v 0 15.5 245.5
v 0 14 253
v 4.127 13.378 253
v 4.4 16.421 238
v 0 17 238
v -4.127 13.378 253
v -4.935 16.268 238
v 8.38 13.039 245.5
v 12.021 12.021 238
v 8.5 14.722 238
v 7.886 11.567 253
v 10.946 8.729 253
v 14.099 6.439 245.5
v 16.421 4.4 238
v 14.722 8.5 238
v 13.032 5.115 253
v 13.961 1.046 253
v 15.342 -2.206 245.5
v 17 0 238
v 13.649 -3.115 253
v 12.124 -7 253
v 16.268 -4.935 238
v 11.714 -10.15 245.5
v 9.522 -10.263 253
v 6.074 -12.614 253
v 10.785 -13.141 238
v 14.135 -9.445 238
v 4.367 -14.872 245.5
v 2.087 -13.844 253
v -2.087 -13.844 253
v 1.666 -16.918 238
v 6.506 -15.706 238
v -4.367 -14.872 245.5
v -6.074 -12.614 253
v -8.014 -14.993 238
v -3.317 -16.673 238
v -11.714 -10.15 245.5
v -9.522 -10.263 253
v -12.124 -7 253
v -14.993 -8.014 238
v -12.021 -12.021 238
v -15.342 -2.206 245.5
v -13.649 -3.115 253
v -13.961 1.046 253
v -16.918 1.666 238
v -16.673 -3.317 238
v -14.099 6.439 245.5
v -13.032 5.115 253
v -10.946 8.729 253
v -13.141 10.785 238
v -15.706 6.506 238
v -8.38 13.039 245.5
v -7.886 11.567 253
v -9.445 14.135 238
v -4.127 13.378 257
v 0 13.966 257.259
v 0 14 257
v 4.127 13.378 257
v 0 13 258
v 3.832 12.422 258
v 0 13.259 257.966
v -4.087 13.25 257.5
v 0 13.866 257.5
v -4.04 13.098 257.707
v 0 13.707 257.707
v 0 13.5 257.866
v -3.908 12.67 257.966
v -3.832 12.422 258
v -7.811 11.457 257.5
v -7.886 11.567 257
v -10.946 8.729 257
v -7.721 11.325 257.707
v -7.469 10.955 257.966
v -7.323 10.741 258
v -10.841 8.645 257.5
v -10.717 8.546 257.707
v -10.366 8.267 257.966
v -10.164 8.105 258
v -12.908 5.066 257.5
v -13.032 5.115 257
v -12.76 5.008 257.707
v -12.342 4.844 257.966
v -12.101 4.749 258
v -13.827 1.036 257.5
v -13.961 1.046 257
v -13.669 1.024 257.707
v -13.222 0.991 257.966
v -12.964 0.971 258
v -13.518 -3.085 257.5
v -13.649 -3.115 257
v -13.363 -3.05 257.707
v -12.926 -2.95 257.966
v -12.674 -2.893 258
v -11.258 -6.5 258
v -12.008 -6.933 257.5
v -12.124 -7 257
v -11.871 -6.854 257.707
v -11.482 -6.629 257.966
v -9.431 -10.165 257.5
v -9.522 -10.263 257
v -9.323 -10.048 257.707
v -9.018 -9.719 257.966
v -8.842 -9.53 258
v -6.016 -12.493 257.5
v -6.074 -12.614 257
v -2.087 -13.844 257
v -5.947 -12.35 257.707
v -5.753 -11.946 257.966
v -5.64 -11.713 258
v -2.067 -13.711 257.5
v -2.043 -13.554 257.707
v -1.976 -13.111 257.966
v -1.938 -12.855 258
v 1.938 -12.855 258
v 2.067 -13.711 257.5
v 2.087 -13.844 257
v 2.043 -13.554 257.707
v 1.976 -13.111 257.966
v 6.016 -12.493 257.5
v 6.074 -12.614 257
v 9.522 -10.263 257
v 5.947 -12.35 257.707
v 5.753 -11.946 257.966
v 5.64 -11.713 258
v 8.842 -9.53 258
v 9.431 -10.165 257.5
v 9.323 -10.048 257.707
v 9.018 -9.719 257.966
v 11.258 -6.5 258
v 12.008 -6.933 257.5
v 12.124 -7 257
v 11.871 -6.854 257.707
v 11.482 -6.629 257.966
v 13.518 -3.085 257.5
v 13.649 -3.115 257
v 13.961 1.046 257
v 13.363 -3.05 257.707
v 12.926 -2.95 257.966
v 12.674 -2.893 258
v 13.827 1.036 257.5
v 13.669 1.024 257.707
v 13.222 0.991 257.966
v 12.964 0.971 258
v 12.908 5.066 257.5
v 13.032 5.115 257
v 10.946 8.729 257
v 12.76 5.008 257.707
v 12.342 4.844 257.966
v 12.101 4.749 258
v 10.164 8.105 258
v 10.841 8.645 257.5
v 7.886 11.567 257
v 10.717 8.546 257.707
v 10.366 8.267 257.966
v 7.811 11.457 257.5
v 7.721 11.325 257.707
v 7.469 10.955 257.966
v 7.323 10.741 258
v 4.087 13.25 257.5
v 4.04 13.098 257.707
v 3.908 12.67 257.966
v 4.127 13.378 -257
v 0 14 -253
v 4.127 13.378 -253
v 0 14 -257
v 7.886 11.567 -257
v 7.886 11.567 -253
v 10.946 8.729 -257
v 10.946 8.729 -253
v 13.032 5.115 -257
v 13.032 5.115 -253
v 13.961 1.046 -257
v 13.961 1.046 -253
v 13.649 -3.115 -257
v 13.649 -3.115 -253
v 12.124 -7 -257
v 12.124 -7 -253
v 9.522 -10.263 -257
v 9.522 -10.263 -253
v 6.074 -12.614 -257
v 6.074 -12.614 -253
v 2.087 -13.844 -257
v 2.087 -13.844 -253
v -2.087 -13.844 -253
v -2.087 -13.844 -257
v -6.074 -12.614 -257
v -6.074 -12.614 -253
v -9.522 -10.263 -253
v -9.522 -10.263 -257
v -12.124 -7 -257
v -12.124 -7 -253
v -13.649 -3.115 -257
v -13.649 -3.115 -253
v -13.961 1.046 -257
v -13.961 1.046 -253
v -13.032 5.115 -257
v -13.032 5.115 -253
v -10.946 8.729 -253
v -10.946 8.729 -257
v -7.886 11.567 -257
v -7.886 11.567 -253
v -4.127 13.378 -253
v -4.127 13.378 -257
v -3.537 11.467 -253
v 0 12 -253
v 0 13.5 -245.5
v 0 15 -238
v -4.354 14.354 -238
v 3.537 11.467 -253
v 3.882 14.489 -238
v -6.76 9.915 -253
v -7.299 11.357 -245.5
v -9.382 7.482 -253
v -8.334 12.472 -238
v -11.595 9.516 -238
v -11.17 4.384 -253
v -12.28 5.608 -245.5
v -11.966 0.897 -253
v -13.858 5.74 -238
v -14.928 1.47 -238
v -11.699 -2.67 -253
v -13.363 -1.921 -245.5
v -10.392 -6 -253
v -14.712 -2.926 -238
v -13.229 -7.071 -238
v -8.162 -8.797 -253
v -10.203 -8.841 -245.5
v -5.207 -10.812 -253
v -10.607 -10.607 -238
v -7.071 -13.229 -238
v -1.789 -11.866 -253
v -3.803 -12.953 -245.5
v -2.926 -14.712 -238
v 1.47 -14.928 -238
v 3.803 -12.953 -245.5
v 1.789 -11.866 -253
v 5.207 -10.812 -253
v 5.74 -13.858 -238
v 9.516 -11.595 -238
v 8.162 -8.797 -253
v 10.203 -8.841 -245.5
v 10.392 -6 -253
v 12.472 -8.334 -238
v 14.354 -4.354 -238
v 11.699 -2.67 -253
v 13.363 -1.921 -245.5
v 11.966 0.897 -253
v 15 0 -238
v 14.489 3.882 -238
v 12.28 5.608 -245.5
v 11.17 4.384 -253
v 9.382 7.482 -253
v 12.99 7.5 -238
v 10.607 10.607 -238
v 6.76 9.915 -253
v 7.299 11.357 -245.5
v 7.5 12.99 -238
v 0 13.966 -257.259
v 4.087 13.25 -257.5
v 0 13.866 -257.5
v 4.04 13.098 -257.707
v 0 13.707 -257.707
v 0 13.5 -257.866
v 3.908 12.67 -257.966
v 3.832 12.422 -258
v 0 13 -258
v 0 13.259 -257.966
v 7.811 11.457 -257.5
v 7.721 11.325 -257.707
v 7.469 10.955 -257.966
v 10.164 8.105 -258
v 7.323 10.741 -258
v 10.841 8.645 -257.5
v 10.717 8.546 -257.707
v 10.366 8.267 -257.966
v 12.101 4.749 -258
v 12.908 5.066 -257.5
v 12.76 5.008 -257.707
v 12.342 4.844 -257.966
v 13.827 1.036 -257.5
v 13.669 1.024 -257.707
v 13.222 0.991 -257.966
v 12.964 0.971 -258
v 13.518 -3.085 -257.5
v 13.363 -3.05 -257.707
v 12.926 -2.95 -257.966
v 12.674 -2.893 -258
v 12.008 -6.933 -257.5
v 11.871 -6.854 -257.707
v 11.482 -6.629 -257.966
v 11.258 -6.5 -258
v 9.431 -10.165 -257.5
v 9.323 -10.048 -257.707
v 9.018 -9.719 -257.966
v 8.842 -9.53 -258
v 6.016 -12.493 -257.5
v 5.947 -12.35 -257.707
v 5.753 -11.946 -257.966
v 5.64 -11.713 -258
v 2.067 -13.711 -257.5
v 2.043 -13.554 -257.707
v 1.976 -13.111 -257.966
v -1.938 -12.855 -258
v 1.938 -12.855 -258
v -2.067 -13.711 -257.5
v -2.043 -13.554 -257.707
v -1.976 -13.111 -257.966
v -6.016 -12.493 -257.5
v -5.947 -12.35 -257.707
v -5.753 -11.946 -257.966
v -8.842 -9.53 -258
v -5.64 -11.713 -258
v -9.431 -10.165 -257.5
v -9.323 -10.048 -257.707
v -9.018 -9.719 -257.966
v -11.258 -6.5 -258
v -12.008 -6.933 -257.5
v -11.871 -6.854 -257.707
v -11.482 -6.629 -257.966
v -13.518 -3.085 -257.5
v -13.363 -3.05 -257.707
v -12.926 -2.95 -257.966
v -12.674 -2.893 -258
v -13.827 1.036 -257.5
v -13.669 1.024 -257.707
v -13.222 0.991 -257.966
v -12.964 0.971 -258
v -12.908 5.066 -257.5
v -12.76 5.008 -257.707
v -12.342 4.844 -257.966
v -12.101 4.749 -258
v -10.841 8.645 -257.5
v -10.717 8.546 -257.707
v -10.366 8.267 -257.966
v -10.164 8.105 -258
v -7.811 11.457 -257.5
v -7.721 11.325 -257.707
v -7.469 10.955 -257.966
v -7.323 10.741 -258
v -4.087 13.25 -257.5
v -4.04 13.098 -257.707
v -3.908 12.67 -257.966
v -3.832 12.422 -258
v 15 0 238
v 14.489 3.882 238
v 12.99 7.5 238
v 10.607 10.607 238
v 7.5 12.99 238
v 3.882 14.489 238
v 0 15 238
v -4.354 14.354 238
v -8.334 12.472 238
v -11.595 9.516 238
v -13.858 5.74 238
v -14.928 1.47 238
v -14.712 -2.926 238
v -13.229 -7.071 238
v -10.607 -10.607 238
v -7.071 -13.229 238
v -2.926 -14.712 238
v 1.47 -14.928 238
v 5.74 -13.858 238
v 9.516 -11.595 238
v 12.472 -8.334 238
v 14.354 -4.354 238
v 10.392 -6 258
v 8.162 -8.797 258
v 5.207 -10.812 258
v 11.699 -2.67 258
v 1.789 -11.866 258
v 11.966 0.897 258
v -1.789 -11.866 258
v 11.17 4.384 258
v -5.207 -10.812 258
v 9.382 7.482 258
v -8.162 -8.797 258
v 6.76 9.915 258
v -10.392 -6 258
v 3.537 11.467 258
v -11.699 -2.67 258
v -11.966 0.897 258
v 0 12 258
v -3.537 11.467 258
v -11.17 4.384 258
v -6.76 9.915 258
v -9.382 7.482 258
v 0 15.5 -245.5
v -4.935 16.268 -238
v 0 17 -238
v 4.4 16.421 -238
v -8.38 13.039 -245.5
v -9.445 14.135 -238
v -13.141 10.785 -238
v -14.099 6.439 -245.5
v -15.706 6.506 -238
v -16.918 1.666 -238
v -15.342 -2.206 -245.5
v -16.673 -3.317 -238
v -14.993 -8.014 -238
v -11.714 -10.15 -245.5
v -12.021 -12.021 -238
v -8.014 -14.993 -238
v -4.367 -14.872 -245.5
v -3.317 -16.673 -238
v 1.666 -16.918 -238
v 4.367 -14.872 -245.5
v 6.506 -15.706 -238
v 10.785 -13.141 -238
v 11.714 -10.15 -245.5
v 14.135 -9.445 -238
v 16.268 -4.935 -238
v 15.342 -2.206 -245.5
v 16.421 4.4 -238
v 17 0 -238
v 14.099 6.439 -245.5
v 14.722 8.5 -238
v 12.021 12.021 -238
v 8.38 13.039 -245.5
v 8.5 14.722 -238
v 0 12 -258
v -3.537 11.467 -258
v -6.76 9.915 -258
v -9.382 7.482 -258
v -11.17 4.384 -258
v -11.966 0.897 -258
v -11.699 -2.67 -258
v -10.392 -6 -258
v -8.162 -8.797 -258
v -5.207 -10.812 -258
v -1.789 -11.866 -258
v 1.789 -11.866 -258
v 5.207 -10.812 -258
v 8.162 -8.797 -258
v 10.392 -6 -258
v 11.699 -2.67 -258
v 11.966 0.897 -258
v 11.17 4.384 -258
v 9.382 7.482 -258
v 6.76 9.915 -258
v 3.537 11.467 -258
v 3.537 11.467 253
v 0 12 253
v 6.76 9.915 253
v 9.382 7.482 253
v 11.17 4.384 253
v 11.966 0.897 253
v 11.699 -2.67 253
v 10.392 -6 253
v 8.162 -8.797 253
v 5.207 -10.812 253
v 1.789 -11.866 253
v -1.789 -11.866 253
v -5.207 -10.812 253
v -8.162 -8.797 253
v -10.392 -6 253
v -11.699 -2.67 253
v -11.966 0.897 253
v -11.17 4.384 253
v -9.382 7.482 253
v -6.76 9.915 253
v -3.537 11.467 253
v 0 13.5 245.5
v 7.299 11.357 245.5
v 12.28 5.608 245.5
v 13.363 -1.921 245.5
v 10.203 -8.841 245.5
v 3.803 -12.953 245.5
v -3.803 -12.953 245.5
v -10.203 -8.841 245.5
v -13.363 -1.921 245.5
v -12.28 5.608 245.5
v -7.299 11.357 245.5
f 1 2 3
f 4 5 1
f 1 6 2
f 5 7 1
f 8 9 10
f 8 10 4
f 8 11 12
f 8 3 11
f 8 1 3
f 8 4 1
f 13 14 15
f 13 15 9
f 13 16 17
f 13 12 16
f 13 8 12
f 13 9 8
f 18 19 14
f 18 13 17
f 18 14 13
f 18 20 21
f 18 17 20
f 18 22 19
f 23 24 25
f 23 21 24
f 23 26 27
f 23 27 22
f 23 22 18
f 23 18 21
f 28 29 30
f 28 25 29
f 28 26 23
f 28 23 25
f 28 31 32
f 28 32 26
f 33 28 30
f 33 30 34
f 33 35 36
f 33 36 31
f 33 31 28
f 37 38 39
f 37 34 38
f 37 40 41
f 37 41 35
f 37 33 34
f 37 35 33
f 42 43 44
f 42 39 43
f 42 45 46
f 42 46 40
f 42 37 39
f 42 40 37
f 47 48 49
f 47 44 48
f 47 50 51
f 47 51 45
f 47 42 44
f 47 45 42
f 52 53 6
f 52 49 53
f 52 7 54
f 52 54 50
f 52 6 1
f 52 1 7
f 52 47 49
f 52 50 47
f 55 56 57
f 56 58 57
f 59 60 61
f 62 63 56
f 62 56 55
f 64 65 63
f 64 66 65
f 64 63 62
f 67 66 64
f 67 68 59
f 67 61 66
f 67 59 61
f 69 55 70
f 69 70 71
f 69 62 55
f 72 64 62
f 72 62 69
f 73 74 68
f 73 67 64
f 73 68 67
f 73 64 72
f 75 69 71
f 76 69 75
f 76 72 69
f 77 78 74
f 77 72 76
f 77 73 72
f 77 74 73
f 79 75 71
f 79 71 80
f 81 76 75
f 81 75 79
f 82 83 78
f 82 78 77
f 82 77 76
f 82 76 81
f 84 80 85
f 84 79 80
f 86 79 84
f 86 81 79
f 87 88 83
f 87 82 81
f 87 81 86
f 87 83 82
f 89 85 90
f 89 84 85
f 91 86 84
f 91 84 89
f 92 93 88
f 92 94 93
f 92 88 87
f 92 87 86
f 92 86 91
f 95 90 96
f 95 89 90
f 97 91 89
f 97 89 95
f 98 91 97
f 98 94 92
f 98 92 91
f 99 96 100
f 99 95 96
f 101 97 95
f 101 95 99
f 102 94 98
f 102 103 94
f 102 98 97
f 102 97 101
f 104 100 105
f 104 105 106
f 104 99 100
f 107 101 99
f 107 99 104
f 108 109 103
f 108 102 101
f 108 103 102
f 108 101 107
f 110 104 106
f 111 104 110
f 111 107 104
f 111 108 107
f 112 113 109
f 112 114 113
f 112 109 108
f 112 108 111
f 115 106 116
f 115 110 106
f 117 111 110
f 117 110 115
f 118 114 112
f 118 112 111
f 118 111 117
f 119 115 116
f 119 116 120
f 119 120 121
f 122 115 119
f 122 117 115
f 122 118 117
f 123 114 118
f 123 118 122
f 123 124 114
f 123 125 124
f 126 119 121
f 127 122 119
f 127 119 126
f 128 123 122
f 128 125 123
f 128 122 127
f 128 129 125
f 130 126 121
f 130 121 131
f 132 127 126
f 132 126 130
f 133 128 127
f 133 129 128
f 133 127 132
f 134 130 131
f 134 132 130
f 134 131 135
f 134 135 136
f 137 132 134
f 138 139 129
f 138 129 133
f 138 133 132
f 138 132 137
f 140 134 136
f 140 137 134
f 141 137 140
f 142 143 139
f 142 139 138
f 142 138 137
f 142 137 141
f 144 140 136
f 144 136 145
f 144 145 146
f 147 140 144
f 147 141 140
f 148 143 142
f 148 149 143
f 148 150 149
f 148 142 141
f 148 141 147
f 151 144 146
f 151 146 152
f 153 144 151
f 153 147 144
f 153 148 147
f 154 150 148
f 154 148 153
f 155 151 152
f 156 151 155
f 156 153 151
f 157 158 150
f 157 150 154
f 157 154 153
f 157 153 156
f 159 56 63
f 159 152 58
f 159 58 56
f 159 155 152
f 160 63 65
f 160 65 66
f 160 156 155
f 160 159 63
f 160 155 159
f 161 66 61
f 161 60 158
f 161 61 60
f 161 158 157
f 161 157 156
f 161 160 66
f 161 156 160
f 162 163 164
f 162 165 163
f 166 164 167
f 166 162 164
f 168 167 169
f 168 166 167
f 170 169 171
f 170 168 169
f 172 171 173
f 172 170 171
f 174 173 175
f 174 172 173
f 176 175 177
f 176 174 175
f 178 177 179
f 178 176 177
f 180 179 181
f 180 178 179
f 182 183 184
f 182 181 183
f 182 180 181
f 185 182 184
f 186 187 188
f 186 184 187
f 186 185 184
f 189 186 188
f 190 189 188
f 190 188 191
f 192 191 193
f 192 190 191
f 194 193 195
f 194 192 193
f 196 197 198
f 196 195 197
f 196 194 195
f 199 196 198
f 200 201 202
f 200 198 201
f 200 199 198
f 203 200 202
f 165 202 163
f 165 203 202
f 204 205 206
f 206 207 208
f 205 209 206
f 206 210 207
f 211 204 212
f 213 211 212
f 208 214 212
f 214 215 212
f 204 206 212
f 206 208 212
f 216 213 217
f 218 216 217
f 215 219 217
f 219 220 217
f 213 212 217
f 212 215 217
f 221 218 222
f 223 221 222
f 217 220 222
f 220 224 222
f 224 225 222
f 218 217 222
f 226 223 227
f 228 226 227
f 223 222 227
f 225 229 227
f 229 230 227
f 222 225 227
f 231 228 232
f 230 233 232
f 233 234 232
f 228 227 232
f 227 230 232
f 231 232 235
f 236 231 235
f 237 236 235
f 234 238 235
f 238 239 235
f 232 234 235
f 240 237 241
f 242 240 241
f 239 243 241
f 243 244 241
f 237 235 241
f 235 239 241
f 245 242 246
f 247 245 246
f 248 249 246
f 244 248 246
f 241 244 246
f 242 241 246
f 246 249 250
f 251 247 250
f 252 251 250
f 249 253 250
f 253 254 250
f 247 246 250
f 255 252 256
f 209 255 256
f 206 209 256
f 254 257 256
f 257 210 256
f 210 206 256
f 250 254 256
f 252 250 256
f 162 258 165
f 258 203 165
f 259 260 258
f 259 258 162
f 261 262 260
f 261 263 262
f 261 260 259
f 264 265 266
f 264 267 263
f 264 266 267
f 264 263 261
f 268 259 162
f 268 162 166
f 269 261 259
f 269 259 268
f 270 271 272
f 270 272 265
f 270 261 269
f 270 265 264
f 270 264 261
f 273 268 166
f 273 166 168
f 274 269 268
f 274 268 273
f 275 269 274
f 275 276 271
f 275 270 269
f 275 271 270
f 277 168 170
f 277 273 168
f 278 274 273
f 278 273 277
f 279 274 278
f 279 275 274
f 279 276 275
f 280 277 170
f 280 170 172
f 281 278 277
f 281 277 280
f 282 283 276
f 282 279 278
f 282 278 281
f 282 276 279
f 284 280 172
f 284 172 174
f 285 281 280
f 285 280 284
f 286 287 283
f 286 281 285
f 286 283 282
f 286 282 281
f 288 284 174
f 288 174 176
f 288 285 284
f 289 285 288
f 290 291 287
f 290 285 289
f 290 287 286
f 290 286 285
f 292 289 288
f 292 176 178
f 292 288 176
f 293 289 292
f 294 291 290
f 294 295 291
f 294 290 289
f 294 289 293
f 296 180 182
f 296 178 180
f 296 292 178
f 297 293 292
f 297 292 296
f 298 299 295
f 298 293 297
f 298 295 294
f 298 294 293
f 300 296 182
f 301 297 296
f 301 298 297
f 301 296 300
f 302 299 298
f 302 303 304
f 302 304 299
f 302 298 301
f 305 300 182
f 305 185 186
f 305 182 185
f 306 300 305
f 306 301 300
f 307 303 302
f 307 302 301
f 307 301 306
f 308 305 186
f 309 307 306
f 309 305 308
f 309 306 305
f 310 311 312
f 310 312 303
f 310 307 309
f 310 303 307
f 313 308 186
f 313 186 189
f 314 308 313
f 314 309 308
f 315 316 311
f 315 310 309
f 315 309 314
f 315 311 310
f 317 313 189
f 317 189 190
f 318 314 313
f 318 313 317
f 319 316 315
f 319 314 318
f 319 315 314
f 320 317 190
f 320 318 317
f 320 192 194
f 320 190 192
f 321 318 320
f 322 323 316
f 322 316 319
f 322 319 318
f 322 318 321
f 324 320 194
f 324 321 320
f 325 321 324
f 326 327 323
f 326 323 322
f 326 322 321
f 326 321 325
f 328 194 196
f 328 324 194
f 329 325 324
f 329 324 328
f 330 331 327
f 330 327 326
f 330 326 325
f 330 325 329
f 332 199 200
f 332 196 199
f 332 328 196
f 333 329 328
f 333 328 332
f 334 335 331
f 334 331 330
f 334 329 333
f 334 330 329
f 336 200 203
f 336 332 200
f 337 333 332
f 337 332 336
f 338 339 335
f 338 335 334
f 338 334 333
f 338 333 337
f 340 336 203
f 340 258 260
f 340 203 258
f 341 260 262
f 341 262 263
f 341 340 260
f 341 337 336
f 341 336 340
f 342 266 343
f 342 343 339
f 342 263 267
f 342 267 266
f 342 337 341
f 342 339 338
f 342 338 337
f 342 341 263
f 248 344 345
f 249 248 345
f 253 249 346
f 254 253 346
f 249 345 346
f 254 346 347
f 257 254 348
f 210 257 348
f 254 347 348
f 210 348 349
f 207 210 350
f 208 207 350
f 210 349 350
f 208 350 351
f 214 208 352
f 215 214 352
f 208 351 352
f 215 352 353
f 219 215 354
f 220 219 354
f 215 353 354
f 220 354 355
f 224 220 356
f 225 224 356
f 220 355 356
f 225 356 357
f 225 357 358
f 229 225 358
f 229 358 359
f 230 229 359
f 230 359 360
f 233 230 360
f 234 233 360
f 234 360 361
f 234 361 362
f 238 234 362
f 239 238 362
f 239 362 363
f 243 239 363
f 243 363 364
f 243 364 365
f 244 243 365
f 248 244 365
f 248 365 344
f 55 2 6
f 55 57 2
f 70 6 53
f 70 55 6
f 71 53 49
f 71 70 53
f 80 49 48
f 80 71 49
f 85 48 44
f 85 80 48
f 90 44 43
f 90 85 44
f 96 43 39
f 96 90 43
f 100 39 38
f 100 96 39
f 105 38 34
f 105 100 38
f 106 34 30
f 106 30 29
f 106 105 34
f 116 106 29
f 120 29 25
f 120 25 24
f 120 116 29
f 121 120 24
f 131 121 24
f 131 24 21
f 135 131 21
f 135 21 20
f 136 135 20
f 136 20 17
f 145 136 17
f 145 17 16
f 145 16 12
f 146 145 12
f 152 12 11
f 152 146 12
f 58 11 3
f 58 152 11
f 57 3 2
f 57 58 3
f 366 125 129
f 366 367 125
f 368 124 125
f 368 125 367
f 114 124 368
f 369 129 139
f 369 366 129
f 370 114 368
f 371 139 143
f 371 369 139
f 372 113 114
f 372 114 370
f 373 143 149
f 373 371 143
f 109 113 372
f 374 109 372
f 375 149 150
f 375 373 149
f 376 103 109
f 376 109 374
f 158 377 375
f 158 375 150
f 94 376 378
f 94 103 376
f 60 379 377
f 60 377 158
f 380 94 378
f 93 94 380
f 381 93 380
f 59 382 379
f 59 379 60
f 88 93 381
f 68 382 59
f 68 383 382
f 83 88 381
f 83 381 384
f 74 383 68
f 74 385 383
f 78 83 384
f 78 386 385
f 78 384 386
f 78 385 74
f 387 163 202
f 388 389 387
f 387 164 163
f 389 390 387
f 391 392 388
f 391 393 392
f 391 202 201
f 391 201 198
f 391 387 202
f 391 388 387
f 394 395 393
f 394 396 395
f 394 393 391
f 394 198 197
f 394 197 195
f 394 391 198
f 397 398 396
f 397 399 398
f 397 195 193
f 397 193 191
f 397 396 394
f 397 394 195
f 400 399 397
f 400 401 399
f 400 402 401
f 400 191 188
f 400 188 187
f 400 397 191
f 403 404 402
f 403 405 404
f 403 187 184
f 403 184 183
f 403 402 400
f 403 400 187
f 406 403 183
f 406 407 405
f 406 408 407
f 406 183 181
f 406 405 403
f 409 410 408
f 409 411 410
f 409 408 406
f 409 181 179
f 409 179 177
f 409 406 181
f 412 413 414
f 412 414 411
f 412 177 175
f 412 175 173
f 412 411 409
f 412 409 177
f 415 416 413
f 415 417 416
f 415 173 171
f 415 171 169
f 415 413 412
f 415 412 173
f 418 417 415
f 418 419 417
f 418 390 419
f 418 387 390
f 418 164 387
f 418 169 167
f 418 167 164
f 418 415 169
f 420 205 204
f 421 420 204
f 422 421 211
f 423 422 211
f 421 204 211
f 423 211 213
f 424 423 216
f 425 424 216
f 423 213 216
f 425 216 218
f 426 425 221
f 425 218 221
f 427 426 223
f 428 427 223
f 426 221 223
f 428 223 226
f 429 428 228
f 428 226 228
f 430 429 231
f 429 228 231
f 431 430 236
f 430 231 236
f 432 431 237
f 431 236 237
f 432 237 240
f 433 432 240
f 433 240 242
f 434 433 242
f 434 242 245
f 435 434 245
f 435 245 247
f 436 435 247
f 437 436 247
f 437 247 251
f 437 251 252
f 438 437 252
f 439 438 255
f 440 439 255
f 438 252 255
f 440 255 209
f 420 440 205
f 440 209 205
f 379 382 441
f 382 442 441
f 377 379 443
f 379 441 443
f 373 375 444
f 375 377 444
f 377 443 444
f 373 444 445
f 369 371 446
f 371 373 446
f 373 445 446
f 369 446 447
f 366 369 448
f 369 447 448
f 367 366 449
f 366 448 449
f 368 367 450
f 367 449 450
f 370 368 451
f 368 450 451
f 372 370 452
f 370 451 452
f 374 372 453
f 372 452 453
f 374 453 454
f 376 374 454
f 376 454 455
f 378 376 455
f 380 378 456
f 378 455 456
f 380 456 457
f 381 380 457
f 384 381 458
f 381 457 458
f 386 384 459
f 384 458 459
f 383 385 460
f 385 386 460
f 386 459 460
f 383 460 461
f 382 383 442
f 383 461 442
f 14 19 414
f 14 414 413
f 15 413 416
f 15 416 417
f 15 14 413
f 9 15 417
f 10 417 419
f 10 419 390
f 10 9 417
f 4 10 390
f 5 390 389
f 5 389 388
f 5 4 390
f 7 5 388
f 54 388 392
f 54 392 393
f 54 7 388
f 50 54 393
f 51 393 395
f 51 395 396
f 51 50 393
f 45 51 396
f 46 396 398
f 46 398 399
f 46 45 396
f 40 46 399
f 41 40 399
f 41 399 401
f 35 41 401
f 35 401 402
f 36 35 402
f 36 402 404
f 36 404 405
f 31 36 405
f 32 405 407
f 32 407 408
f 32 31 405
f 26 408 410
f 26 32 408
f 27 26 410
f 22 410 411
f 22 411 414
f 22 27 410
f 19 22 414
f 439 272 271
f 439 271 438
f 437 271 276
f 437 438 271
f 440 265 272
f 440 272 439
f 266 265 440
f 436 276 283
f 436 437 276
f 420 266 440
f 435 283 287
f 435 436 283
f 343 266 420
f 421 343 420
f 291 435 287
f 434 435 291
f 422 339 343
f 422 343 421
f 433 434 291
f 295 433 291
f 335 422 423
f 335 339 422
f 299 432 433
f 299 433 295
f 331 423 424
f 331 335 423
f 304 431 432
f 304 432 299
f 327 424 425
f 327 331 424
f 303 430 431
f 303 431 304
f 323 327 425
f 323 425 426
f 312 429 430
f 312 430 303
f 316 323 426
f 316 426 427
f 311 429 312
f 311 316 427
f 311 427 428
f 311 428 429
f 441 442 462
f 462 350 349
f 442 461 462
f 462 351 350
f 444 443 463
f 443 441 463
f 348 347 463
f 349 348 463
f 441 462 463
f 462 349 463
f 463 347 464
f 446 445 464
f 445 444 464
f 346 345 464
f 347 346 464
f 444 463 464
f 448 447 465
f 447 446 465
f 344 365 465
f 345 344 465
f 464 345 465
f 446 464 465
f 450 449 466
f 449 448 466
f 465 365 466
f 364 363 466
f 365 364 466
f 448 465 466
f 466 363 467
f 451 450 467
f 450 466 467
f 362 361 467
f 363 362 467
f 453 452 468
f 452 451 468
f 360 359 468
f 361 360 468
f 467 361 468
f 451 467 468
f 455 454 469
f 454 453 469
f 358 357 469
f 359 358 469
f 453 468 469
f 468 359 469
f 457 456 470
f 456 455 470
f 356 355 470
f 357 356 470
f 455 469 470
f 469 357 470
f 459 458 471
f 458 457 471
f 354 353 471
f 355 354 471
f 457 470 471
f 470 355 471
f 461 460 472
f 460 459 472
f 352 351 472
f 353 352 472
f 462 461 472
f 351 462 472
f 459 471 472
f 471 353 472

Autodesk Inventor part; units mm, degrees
ref_plane "YZ Plane" through (0, 0, 0) normal (1, 0, 0) x (0, 1, 0)
ref_plane "XZ Plane" through (0, 0, 0) normal (0, 1, 0) x (-1, 0, 0)
ref_plane "XY Plane" through (0, 0, 0) normal (0, 0, 1) x (1, 0, 0)
sketch "Sketch1" plane through (0, 0, 0) normal (0, 0, 1) x (1, 0, 0)
  circle A0 centre (0, 0) radius 15
  circle A1 centre (0, 0) radius 17
  dimension "d0" = 30
  dimension "d1" = 2
extrude "Extrusion1" add sketch "Sketch1" against normal mid plane 476
sketch "Sketch2" plane through (0, 0, 0) normal (1, 0, 0) x (0, 1, 0)
  line L0 (15, -238) -> (15, 238) projected
  line L1 (17, 238) -> (17, -238) projected
  line L2 (14, 253) -> (14, 258)
  line L3 (14, 258) -> (12, 258)
  line L4 (12, 258) -> (12, 253)
  line L5 (17, 238) -> (-17, 238) projected
  line L6 (14, 253) -> (17, 238)
  line L7 (12, 253) -> (15, 238)
  line L8 (0, 0) -> (0, 22.4237)
  dimension "d4" = 2
  dimension "d5" = 2
  dimension "d8" = 12
  dimension "d10" = 5
  dimension "d13" = 20
revolve "Revolution1" add sketch "Sketch2" angle 360 about axis through (0, 0, 0) along (0, 0, 1)
fillet "Fillet2" radius 1 1 edges at (0, -14, 258)
mirror "Mirror1" about plane through (0, 0, 0) normal (0, 0, 1) of "Revolution1", "Fillet2"
equation "\"d5\" = d4"
properties part number "OuterGlassTube" material "Glass"
